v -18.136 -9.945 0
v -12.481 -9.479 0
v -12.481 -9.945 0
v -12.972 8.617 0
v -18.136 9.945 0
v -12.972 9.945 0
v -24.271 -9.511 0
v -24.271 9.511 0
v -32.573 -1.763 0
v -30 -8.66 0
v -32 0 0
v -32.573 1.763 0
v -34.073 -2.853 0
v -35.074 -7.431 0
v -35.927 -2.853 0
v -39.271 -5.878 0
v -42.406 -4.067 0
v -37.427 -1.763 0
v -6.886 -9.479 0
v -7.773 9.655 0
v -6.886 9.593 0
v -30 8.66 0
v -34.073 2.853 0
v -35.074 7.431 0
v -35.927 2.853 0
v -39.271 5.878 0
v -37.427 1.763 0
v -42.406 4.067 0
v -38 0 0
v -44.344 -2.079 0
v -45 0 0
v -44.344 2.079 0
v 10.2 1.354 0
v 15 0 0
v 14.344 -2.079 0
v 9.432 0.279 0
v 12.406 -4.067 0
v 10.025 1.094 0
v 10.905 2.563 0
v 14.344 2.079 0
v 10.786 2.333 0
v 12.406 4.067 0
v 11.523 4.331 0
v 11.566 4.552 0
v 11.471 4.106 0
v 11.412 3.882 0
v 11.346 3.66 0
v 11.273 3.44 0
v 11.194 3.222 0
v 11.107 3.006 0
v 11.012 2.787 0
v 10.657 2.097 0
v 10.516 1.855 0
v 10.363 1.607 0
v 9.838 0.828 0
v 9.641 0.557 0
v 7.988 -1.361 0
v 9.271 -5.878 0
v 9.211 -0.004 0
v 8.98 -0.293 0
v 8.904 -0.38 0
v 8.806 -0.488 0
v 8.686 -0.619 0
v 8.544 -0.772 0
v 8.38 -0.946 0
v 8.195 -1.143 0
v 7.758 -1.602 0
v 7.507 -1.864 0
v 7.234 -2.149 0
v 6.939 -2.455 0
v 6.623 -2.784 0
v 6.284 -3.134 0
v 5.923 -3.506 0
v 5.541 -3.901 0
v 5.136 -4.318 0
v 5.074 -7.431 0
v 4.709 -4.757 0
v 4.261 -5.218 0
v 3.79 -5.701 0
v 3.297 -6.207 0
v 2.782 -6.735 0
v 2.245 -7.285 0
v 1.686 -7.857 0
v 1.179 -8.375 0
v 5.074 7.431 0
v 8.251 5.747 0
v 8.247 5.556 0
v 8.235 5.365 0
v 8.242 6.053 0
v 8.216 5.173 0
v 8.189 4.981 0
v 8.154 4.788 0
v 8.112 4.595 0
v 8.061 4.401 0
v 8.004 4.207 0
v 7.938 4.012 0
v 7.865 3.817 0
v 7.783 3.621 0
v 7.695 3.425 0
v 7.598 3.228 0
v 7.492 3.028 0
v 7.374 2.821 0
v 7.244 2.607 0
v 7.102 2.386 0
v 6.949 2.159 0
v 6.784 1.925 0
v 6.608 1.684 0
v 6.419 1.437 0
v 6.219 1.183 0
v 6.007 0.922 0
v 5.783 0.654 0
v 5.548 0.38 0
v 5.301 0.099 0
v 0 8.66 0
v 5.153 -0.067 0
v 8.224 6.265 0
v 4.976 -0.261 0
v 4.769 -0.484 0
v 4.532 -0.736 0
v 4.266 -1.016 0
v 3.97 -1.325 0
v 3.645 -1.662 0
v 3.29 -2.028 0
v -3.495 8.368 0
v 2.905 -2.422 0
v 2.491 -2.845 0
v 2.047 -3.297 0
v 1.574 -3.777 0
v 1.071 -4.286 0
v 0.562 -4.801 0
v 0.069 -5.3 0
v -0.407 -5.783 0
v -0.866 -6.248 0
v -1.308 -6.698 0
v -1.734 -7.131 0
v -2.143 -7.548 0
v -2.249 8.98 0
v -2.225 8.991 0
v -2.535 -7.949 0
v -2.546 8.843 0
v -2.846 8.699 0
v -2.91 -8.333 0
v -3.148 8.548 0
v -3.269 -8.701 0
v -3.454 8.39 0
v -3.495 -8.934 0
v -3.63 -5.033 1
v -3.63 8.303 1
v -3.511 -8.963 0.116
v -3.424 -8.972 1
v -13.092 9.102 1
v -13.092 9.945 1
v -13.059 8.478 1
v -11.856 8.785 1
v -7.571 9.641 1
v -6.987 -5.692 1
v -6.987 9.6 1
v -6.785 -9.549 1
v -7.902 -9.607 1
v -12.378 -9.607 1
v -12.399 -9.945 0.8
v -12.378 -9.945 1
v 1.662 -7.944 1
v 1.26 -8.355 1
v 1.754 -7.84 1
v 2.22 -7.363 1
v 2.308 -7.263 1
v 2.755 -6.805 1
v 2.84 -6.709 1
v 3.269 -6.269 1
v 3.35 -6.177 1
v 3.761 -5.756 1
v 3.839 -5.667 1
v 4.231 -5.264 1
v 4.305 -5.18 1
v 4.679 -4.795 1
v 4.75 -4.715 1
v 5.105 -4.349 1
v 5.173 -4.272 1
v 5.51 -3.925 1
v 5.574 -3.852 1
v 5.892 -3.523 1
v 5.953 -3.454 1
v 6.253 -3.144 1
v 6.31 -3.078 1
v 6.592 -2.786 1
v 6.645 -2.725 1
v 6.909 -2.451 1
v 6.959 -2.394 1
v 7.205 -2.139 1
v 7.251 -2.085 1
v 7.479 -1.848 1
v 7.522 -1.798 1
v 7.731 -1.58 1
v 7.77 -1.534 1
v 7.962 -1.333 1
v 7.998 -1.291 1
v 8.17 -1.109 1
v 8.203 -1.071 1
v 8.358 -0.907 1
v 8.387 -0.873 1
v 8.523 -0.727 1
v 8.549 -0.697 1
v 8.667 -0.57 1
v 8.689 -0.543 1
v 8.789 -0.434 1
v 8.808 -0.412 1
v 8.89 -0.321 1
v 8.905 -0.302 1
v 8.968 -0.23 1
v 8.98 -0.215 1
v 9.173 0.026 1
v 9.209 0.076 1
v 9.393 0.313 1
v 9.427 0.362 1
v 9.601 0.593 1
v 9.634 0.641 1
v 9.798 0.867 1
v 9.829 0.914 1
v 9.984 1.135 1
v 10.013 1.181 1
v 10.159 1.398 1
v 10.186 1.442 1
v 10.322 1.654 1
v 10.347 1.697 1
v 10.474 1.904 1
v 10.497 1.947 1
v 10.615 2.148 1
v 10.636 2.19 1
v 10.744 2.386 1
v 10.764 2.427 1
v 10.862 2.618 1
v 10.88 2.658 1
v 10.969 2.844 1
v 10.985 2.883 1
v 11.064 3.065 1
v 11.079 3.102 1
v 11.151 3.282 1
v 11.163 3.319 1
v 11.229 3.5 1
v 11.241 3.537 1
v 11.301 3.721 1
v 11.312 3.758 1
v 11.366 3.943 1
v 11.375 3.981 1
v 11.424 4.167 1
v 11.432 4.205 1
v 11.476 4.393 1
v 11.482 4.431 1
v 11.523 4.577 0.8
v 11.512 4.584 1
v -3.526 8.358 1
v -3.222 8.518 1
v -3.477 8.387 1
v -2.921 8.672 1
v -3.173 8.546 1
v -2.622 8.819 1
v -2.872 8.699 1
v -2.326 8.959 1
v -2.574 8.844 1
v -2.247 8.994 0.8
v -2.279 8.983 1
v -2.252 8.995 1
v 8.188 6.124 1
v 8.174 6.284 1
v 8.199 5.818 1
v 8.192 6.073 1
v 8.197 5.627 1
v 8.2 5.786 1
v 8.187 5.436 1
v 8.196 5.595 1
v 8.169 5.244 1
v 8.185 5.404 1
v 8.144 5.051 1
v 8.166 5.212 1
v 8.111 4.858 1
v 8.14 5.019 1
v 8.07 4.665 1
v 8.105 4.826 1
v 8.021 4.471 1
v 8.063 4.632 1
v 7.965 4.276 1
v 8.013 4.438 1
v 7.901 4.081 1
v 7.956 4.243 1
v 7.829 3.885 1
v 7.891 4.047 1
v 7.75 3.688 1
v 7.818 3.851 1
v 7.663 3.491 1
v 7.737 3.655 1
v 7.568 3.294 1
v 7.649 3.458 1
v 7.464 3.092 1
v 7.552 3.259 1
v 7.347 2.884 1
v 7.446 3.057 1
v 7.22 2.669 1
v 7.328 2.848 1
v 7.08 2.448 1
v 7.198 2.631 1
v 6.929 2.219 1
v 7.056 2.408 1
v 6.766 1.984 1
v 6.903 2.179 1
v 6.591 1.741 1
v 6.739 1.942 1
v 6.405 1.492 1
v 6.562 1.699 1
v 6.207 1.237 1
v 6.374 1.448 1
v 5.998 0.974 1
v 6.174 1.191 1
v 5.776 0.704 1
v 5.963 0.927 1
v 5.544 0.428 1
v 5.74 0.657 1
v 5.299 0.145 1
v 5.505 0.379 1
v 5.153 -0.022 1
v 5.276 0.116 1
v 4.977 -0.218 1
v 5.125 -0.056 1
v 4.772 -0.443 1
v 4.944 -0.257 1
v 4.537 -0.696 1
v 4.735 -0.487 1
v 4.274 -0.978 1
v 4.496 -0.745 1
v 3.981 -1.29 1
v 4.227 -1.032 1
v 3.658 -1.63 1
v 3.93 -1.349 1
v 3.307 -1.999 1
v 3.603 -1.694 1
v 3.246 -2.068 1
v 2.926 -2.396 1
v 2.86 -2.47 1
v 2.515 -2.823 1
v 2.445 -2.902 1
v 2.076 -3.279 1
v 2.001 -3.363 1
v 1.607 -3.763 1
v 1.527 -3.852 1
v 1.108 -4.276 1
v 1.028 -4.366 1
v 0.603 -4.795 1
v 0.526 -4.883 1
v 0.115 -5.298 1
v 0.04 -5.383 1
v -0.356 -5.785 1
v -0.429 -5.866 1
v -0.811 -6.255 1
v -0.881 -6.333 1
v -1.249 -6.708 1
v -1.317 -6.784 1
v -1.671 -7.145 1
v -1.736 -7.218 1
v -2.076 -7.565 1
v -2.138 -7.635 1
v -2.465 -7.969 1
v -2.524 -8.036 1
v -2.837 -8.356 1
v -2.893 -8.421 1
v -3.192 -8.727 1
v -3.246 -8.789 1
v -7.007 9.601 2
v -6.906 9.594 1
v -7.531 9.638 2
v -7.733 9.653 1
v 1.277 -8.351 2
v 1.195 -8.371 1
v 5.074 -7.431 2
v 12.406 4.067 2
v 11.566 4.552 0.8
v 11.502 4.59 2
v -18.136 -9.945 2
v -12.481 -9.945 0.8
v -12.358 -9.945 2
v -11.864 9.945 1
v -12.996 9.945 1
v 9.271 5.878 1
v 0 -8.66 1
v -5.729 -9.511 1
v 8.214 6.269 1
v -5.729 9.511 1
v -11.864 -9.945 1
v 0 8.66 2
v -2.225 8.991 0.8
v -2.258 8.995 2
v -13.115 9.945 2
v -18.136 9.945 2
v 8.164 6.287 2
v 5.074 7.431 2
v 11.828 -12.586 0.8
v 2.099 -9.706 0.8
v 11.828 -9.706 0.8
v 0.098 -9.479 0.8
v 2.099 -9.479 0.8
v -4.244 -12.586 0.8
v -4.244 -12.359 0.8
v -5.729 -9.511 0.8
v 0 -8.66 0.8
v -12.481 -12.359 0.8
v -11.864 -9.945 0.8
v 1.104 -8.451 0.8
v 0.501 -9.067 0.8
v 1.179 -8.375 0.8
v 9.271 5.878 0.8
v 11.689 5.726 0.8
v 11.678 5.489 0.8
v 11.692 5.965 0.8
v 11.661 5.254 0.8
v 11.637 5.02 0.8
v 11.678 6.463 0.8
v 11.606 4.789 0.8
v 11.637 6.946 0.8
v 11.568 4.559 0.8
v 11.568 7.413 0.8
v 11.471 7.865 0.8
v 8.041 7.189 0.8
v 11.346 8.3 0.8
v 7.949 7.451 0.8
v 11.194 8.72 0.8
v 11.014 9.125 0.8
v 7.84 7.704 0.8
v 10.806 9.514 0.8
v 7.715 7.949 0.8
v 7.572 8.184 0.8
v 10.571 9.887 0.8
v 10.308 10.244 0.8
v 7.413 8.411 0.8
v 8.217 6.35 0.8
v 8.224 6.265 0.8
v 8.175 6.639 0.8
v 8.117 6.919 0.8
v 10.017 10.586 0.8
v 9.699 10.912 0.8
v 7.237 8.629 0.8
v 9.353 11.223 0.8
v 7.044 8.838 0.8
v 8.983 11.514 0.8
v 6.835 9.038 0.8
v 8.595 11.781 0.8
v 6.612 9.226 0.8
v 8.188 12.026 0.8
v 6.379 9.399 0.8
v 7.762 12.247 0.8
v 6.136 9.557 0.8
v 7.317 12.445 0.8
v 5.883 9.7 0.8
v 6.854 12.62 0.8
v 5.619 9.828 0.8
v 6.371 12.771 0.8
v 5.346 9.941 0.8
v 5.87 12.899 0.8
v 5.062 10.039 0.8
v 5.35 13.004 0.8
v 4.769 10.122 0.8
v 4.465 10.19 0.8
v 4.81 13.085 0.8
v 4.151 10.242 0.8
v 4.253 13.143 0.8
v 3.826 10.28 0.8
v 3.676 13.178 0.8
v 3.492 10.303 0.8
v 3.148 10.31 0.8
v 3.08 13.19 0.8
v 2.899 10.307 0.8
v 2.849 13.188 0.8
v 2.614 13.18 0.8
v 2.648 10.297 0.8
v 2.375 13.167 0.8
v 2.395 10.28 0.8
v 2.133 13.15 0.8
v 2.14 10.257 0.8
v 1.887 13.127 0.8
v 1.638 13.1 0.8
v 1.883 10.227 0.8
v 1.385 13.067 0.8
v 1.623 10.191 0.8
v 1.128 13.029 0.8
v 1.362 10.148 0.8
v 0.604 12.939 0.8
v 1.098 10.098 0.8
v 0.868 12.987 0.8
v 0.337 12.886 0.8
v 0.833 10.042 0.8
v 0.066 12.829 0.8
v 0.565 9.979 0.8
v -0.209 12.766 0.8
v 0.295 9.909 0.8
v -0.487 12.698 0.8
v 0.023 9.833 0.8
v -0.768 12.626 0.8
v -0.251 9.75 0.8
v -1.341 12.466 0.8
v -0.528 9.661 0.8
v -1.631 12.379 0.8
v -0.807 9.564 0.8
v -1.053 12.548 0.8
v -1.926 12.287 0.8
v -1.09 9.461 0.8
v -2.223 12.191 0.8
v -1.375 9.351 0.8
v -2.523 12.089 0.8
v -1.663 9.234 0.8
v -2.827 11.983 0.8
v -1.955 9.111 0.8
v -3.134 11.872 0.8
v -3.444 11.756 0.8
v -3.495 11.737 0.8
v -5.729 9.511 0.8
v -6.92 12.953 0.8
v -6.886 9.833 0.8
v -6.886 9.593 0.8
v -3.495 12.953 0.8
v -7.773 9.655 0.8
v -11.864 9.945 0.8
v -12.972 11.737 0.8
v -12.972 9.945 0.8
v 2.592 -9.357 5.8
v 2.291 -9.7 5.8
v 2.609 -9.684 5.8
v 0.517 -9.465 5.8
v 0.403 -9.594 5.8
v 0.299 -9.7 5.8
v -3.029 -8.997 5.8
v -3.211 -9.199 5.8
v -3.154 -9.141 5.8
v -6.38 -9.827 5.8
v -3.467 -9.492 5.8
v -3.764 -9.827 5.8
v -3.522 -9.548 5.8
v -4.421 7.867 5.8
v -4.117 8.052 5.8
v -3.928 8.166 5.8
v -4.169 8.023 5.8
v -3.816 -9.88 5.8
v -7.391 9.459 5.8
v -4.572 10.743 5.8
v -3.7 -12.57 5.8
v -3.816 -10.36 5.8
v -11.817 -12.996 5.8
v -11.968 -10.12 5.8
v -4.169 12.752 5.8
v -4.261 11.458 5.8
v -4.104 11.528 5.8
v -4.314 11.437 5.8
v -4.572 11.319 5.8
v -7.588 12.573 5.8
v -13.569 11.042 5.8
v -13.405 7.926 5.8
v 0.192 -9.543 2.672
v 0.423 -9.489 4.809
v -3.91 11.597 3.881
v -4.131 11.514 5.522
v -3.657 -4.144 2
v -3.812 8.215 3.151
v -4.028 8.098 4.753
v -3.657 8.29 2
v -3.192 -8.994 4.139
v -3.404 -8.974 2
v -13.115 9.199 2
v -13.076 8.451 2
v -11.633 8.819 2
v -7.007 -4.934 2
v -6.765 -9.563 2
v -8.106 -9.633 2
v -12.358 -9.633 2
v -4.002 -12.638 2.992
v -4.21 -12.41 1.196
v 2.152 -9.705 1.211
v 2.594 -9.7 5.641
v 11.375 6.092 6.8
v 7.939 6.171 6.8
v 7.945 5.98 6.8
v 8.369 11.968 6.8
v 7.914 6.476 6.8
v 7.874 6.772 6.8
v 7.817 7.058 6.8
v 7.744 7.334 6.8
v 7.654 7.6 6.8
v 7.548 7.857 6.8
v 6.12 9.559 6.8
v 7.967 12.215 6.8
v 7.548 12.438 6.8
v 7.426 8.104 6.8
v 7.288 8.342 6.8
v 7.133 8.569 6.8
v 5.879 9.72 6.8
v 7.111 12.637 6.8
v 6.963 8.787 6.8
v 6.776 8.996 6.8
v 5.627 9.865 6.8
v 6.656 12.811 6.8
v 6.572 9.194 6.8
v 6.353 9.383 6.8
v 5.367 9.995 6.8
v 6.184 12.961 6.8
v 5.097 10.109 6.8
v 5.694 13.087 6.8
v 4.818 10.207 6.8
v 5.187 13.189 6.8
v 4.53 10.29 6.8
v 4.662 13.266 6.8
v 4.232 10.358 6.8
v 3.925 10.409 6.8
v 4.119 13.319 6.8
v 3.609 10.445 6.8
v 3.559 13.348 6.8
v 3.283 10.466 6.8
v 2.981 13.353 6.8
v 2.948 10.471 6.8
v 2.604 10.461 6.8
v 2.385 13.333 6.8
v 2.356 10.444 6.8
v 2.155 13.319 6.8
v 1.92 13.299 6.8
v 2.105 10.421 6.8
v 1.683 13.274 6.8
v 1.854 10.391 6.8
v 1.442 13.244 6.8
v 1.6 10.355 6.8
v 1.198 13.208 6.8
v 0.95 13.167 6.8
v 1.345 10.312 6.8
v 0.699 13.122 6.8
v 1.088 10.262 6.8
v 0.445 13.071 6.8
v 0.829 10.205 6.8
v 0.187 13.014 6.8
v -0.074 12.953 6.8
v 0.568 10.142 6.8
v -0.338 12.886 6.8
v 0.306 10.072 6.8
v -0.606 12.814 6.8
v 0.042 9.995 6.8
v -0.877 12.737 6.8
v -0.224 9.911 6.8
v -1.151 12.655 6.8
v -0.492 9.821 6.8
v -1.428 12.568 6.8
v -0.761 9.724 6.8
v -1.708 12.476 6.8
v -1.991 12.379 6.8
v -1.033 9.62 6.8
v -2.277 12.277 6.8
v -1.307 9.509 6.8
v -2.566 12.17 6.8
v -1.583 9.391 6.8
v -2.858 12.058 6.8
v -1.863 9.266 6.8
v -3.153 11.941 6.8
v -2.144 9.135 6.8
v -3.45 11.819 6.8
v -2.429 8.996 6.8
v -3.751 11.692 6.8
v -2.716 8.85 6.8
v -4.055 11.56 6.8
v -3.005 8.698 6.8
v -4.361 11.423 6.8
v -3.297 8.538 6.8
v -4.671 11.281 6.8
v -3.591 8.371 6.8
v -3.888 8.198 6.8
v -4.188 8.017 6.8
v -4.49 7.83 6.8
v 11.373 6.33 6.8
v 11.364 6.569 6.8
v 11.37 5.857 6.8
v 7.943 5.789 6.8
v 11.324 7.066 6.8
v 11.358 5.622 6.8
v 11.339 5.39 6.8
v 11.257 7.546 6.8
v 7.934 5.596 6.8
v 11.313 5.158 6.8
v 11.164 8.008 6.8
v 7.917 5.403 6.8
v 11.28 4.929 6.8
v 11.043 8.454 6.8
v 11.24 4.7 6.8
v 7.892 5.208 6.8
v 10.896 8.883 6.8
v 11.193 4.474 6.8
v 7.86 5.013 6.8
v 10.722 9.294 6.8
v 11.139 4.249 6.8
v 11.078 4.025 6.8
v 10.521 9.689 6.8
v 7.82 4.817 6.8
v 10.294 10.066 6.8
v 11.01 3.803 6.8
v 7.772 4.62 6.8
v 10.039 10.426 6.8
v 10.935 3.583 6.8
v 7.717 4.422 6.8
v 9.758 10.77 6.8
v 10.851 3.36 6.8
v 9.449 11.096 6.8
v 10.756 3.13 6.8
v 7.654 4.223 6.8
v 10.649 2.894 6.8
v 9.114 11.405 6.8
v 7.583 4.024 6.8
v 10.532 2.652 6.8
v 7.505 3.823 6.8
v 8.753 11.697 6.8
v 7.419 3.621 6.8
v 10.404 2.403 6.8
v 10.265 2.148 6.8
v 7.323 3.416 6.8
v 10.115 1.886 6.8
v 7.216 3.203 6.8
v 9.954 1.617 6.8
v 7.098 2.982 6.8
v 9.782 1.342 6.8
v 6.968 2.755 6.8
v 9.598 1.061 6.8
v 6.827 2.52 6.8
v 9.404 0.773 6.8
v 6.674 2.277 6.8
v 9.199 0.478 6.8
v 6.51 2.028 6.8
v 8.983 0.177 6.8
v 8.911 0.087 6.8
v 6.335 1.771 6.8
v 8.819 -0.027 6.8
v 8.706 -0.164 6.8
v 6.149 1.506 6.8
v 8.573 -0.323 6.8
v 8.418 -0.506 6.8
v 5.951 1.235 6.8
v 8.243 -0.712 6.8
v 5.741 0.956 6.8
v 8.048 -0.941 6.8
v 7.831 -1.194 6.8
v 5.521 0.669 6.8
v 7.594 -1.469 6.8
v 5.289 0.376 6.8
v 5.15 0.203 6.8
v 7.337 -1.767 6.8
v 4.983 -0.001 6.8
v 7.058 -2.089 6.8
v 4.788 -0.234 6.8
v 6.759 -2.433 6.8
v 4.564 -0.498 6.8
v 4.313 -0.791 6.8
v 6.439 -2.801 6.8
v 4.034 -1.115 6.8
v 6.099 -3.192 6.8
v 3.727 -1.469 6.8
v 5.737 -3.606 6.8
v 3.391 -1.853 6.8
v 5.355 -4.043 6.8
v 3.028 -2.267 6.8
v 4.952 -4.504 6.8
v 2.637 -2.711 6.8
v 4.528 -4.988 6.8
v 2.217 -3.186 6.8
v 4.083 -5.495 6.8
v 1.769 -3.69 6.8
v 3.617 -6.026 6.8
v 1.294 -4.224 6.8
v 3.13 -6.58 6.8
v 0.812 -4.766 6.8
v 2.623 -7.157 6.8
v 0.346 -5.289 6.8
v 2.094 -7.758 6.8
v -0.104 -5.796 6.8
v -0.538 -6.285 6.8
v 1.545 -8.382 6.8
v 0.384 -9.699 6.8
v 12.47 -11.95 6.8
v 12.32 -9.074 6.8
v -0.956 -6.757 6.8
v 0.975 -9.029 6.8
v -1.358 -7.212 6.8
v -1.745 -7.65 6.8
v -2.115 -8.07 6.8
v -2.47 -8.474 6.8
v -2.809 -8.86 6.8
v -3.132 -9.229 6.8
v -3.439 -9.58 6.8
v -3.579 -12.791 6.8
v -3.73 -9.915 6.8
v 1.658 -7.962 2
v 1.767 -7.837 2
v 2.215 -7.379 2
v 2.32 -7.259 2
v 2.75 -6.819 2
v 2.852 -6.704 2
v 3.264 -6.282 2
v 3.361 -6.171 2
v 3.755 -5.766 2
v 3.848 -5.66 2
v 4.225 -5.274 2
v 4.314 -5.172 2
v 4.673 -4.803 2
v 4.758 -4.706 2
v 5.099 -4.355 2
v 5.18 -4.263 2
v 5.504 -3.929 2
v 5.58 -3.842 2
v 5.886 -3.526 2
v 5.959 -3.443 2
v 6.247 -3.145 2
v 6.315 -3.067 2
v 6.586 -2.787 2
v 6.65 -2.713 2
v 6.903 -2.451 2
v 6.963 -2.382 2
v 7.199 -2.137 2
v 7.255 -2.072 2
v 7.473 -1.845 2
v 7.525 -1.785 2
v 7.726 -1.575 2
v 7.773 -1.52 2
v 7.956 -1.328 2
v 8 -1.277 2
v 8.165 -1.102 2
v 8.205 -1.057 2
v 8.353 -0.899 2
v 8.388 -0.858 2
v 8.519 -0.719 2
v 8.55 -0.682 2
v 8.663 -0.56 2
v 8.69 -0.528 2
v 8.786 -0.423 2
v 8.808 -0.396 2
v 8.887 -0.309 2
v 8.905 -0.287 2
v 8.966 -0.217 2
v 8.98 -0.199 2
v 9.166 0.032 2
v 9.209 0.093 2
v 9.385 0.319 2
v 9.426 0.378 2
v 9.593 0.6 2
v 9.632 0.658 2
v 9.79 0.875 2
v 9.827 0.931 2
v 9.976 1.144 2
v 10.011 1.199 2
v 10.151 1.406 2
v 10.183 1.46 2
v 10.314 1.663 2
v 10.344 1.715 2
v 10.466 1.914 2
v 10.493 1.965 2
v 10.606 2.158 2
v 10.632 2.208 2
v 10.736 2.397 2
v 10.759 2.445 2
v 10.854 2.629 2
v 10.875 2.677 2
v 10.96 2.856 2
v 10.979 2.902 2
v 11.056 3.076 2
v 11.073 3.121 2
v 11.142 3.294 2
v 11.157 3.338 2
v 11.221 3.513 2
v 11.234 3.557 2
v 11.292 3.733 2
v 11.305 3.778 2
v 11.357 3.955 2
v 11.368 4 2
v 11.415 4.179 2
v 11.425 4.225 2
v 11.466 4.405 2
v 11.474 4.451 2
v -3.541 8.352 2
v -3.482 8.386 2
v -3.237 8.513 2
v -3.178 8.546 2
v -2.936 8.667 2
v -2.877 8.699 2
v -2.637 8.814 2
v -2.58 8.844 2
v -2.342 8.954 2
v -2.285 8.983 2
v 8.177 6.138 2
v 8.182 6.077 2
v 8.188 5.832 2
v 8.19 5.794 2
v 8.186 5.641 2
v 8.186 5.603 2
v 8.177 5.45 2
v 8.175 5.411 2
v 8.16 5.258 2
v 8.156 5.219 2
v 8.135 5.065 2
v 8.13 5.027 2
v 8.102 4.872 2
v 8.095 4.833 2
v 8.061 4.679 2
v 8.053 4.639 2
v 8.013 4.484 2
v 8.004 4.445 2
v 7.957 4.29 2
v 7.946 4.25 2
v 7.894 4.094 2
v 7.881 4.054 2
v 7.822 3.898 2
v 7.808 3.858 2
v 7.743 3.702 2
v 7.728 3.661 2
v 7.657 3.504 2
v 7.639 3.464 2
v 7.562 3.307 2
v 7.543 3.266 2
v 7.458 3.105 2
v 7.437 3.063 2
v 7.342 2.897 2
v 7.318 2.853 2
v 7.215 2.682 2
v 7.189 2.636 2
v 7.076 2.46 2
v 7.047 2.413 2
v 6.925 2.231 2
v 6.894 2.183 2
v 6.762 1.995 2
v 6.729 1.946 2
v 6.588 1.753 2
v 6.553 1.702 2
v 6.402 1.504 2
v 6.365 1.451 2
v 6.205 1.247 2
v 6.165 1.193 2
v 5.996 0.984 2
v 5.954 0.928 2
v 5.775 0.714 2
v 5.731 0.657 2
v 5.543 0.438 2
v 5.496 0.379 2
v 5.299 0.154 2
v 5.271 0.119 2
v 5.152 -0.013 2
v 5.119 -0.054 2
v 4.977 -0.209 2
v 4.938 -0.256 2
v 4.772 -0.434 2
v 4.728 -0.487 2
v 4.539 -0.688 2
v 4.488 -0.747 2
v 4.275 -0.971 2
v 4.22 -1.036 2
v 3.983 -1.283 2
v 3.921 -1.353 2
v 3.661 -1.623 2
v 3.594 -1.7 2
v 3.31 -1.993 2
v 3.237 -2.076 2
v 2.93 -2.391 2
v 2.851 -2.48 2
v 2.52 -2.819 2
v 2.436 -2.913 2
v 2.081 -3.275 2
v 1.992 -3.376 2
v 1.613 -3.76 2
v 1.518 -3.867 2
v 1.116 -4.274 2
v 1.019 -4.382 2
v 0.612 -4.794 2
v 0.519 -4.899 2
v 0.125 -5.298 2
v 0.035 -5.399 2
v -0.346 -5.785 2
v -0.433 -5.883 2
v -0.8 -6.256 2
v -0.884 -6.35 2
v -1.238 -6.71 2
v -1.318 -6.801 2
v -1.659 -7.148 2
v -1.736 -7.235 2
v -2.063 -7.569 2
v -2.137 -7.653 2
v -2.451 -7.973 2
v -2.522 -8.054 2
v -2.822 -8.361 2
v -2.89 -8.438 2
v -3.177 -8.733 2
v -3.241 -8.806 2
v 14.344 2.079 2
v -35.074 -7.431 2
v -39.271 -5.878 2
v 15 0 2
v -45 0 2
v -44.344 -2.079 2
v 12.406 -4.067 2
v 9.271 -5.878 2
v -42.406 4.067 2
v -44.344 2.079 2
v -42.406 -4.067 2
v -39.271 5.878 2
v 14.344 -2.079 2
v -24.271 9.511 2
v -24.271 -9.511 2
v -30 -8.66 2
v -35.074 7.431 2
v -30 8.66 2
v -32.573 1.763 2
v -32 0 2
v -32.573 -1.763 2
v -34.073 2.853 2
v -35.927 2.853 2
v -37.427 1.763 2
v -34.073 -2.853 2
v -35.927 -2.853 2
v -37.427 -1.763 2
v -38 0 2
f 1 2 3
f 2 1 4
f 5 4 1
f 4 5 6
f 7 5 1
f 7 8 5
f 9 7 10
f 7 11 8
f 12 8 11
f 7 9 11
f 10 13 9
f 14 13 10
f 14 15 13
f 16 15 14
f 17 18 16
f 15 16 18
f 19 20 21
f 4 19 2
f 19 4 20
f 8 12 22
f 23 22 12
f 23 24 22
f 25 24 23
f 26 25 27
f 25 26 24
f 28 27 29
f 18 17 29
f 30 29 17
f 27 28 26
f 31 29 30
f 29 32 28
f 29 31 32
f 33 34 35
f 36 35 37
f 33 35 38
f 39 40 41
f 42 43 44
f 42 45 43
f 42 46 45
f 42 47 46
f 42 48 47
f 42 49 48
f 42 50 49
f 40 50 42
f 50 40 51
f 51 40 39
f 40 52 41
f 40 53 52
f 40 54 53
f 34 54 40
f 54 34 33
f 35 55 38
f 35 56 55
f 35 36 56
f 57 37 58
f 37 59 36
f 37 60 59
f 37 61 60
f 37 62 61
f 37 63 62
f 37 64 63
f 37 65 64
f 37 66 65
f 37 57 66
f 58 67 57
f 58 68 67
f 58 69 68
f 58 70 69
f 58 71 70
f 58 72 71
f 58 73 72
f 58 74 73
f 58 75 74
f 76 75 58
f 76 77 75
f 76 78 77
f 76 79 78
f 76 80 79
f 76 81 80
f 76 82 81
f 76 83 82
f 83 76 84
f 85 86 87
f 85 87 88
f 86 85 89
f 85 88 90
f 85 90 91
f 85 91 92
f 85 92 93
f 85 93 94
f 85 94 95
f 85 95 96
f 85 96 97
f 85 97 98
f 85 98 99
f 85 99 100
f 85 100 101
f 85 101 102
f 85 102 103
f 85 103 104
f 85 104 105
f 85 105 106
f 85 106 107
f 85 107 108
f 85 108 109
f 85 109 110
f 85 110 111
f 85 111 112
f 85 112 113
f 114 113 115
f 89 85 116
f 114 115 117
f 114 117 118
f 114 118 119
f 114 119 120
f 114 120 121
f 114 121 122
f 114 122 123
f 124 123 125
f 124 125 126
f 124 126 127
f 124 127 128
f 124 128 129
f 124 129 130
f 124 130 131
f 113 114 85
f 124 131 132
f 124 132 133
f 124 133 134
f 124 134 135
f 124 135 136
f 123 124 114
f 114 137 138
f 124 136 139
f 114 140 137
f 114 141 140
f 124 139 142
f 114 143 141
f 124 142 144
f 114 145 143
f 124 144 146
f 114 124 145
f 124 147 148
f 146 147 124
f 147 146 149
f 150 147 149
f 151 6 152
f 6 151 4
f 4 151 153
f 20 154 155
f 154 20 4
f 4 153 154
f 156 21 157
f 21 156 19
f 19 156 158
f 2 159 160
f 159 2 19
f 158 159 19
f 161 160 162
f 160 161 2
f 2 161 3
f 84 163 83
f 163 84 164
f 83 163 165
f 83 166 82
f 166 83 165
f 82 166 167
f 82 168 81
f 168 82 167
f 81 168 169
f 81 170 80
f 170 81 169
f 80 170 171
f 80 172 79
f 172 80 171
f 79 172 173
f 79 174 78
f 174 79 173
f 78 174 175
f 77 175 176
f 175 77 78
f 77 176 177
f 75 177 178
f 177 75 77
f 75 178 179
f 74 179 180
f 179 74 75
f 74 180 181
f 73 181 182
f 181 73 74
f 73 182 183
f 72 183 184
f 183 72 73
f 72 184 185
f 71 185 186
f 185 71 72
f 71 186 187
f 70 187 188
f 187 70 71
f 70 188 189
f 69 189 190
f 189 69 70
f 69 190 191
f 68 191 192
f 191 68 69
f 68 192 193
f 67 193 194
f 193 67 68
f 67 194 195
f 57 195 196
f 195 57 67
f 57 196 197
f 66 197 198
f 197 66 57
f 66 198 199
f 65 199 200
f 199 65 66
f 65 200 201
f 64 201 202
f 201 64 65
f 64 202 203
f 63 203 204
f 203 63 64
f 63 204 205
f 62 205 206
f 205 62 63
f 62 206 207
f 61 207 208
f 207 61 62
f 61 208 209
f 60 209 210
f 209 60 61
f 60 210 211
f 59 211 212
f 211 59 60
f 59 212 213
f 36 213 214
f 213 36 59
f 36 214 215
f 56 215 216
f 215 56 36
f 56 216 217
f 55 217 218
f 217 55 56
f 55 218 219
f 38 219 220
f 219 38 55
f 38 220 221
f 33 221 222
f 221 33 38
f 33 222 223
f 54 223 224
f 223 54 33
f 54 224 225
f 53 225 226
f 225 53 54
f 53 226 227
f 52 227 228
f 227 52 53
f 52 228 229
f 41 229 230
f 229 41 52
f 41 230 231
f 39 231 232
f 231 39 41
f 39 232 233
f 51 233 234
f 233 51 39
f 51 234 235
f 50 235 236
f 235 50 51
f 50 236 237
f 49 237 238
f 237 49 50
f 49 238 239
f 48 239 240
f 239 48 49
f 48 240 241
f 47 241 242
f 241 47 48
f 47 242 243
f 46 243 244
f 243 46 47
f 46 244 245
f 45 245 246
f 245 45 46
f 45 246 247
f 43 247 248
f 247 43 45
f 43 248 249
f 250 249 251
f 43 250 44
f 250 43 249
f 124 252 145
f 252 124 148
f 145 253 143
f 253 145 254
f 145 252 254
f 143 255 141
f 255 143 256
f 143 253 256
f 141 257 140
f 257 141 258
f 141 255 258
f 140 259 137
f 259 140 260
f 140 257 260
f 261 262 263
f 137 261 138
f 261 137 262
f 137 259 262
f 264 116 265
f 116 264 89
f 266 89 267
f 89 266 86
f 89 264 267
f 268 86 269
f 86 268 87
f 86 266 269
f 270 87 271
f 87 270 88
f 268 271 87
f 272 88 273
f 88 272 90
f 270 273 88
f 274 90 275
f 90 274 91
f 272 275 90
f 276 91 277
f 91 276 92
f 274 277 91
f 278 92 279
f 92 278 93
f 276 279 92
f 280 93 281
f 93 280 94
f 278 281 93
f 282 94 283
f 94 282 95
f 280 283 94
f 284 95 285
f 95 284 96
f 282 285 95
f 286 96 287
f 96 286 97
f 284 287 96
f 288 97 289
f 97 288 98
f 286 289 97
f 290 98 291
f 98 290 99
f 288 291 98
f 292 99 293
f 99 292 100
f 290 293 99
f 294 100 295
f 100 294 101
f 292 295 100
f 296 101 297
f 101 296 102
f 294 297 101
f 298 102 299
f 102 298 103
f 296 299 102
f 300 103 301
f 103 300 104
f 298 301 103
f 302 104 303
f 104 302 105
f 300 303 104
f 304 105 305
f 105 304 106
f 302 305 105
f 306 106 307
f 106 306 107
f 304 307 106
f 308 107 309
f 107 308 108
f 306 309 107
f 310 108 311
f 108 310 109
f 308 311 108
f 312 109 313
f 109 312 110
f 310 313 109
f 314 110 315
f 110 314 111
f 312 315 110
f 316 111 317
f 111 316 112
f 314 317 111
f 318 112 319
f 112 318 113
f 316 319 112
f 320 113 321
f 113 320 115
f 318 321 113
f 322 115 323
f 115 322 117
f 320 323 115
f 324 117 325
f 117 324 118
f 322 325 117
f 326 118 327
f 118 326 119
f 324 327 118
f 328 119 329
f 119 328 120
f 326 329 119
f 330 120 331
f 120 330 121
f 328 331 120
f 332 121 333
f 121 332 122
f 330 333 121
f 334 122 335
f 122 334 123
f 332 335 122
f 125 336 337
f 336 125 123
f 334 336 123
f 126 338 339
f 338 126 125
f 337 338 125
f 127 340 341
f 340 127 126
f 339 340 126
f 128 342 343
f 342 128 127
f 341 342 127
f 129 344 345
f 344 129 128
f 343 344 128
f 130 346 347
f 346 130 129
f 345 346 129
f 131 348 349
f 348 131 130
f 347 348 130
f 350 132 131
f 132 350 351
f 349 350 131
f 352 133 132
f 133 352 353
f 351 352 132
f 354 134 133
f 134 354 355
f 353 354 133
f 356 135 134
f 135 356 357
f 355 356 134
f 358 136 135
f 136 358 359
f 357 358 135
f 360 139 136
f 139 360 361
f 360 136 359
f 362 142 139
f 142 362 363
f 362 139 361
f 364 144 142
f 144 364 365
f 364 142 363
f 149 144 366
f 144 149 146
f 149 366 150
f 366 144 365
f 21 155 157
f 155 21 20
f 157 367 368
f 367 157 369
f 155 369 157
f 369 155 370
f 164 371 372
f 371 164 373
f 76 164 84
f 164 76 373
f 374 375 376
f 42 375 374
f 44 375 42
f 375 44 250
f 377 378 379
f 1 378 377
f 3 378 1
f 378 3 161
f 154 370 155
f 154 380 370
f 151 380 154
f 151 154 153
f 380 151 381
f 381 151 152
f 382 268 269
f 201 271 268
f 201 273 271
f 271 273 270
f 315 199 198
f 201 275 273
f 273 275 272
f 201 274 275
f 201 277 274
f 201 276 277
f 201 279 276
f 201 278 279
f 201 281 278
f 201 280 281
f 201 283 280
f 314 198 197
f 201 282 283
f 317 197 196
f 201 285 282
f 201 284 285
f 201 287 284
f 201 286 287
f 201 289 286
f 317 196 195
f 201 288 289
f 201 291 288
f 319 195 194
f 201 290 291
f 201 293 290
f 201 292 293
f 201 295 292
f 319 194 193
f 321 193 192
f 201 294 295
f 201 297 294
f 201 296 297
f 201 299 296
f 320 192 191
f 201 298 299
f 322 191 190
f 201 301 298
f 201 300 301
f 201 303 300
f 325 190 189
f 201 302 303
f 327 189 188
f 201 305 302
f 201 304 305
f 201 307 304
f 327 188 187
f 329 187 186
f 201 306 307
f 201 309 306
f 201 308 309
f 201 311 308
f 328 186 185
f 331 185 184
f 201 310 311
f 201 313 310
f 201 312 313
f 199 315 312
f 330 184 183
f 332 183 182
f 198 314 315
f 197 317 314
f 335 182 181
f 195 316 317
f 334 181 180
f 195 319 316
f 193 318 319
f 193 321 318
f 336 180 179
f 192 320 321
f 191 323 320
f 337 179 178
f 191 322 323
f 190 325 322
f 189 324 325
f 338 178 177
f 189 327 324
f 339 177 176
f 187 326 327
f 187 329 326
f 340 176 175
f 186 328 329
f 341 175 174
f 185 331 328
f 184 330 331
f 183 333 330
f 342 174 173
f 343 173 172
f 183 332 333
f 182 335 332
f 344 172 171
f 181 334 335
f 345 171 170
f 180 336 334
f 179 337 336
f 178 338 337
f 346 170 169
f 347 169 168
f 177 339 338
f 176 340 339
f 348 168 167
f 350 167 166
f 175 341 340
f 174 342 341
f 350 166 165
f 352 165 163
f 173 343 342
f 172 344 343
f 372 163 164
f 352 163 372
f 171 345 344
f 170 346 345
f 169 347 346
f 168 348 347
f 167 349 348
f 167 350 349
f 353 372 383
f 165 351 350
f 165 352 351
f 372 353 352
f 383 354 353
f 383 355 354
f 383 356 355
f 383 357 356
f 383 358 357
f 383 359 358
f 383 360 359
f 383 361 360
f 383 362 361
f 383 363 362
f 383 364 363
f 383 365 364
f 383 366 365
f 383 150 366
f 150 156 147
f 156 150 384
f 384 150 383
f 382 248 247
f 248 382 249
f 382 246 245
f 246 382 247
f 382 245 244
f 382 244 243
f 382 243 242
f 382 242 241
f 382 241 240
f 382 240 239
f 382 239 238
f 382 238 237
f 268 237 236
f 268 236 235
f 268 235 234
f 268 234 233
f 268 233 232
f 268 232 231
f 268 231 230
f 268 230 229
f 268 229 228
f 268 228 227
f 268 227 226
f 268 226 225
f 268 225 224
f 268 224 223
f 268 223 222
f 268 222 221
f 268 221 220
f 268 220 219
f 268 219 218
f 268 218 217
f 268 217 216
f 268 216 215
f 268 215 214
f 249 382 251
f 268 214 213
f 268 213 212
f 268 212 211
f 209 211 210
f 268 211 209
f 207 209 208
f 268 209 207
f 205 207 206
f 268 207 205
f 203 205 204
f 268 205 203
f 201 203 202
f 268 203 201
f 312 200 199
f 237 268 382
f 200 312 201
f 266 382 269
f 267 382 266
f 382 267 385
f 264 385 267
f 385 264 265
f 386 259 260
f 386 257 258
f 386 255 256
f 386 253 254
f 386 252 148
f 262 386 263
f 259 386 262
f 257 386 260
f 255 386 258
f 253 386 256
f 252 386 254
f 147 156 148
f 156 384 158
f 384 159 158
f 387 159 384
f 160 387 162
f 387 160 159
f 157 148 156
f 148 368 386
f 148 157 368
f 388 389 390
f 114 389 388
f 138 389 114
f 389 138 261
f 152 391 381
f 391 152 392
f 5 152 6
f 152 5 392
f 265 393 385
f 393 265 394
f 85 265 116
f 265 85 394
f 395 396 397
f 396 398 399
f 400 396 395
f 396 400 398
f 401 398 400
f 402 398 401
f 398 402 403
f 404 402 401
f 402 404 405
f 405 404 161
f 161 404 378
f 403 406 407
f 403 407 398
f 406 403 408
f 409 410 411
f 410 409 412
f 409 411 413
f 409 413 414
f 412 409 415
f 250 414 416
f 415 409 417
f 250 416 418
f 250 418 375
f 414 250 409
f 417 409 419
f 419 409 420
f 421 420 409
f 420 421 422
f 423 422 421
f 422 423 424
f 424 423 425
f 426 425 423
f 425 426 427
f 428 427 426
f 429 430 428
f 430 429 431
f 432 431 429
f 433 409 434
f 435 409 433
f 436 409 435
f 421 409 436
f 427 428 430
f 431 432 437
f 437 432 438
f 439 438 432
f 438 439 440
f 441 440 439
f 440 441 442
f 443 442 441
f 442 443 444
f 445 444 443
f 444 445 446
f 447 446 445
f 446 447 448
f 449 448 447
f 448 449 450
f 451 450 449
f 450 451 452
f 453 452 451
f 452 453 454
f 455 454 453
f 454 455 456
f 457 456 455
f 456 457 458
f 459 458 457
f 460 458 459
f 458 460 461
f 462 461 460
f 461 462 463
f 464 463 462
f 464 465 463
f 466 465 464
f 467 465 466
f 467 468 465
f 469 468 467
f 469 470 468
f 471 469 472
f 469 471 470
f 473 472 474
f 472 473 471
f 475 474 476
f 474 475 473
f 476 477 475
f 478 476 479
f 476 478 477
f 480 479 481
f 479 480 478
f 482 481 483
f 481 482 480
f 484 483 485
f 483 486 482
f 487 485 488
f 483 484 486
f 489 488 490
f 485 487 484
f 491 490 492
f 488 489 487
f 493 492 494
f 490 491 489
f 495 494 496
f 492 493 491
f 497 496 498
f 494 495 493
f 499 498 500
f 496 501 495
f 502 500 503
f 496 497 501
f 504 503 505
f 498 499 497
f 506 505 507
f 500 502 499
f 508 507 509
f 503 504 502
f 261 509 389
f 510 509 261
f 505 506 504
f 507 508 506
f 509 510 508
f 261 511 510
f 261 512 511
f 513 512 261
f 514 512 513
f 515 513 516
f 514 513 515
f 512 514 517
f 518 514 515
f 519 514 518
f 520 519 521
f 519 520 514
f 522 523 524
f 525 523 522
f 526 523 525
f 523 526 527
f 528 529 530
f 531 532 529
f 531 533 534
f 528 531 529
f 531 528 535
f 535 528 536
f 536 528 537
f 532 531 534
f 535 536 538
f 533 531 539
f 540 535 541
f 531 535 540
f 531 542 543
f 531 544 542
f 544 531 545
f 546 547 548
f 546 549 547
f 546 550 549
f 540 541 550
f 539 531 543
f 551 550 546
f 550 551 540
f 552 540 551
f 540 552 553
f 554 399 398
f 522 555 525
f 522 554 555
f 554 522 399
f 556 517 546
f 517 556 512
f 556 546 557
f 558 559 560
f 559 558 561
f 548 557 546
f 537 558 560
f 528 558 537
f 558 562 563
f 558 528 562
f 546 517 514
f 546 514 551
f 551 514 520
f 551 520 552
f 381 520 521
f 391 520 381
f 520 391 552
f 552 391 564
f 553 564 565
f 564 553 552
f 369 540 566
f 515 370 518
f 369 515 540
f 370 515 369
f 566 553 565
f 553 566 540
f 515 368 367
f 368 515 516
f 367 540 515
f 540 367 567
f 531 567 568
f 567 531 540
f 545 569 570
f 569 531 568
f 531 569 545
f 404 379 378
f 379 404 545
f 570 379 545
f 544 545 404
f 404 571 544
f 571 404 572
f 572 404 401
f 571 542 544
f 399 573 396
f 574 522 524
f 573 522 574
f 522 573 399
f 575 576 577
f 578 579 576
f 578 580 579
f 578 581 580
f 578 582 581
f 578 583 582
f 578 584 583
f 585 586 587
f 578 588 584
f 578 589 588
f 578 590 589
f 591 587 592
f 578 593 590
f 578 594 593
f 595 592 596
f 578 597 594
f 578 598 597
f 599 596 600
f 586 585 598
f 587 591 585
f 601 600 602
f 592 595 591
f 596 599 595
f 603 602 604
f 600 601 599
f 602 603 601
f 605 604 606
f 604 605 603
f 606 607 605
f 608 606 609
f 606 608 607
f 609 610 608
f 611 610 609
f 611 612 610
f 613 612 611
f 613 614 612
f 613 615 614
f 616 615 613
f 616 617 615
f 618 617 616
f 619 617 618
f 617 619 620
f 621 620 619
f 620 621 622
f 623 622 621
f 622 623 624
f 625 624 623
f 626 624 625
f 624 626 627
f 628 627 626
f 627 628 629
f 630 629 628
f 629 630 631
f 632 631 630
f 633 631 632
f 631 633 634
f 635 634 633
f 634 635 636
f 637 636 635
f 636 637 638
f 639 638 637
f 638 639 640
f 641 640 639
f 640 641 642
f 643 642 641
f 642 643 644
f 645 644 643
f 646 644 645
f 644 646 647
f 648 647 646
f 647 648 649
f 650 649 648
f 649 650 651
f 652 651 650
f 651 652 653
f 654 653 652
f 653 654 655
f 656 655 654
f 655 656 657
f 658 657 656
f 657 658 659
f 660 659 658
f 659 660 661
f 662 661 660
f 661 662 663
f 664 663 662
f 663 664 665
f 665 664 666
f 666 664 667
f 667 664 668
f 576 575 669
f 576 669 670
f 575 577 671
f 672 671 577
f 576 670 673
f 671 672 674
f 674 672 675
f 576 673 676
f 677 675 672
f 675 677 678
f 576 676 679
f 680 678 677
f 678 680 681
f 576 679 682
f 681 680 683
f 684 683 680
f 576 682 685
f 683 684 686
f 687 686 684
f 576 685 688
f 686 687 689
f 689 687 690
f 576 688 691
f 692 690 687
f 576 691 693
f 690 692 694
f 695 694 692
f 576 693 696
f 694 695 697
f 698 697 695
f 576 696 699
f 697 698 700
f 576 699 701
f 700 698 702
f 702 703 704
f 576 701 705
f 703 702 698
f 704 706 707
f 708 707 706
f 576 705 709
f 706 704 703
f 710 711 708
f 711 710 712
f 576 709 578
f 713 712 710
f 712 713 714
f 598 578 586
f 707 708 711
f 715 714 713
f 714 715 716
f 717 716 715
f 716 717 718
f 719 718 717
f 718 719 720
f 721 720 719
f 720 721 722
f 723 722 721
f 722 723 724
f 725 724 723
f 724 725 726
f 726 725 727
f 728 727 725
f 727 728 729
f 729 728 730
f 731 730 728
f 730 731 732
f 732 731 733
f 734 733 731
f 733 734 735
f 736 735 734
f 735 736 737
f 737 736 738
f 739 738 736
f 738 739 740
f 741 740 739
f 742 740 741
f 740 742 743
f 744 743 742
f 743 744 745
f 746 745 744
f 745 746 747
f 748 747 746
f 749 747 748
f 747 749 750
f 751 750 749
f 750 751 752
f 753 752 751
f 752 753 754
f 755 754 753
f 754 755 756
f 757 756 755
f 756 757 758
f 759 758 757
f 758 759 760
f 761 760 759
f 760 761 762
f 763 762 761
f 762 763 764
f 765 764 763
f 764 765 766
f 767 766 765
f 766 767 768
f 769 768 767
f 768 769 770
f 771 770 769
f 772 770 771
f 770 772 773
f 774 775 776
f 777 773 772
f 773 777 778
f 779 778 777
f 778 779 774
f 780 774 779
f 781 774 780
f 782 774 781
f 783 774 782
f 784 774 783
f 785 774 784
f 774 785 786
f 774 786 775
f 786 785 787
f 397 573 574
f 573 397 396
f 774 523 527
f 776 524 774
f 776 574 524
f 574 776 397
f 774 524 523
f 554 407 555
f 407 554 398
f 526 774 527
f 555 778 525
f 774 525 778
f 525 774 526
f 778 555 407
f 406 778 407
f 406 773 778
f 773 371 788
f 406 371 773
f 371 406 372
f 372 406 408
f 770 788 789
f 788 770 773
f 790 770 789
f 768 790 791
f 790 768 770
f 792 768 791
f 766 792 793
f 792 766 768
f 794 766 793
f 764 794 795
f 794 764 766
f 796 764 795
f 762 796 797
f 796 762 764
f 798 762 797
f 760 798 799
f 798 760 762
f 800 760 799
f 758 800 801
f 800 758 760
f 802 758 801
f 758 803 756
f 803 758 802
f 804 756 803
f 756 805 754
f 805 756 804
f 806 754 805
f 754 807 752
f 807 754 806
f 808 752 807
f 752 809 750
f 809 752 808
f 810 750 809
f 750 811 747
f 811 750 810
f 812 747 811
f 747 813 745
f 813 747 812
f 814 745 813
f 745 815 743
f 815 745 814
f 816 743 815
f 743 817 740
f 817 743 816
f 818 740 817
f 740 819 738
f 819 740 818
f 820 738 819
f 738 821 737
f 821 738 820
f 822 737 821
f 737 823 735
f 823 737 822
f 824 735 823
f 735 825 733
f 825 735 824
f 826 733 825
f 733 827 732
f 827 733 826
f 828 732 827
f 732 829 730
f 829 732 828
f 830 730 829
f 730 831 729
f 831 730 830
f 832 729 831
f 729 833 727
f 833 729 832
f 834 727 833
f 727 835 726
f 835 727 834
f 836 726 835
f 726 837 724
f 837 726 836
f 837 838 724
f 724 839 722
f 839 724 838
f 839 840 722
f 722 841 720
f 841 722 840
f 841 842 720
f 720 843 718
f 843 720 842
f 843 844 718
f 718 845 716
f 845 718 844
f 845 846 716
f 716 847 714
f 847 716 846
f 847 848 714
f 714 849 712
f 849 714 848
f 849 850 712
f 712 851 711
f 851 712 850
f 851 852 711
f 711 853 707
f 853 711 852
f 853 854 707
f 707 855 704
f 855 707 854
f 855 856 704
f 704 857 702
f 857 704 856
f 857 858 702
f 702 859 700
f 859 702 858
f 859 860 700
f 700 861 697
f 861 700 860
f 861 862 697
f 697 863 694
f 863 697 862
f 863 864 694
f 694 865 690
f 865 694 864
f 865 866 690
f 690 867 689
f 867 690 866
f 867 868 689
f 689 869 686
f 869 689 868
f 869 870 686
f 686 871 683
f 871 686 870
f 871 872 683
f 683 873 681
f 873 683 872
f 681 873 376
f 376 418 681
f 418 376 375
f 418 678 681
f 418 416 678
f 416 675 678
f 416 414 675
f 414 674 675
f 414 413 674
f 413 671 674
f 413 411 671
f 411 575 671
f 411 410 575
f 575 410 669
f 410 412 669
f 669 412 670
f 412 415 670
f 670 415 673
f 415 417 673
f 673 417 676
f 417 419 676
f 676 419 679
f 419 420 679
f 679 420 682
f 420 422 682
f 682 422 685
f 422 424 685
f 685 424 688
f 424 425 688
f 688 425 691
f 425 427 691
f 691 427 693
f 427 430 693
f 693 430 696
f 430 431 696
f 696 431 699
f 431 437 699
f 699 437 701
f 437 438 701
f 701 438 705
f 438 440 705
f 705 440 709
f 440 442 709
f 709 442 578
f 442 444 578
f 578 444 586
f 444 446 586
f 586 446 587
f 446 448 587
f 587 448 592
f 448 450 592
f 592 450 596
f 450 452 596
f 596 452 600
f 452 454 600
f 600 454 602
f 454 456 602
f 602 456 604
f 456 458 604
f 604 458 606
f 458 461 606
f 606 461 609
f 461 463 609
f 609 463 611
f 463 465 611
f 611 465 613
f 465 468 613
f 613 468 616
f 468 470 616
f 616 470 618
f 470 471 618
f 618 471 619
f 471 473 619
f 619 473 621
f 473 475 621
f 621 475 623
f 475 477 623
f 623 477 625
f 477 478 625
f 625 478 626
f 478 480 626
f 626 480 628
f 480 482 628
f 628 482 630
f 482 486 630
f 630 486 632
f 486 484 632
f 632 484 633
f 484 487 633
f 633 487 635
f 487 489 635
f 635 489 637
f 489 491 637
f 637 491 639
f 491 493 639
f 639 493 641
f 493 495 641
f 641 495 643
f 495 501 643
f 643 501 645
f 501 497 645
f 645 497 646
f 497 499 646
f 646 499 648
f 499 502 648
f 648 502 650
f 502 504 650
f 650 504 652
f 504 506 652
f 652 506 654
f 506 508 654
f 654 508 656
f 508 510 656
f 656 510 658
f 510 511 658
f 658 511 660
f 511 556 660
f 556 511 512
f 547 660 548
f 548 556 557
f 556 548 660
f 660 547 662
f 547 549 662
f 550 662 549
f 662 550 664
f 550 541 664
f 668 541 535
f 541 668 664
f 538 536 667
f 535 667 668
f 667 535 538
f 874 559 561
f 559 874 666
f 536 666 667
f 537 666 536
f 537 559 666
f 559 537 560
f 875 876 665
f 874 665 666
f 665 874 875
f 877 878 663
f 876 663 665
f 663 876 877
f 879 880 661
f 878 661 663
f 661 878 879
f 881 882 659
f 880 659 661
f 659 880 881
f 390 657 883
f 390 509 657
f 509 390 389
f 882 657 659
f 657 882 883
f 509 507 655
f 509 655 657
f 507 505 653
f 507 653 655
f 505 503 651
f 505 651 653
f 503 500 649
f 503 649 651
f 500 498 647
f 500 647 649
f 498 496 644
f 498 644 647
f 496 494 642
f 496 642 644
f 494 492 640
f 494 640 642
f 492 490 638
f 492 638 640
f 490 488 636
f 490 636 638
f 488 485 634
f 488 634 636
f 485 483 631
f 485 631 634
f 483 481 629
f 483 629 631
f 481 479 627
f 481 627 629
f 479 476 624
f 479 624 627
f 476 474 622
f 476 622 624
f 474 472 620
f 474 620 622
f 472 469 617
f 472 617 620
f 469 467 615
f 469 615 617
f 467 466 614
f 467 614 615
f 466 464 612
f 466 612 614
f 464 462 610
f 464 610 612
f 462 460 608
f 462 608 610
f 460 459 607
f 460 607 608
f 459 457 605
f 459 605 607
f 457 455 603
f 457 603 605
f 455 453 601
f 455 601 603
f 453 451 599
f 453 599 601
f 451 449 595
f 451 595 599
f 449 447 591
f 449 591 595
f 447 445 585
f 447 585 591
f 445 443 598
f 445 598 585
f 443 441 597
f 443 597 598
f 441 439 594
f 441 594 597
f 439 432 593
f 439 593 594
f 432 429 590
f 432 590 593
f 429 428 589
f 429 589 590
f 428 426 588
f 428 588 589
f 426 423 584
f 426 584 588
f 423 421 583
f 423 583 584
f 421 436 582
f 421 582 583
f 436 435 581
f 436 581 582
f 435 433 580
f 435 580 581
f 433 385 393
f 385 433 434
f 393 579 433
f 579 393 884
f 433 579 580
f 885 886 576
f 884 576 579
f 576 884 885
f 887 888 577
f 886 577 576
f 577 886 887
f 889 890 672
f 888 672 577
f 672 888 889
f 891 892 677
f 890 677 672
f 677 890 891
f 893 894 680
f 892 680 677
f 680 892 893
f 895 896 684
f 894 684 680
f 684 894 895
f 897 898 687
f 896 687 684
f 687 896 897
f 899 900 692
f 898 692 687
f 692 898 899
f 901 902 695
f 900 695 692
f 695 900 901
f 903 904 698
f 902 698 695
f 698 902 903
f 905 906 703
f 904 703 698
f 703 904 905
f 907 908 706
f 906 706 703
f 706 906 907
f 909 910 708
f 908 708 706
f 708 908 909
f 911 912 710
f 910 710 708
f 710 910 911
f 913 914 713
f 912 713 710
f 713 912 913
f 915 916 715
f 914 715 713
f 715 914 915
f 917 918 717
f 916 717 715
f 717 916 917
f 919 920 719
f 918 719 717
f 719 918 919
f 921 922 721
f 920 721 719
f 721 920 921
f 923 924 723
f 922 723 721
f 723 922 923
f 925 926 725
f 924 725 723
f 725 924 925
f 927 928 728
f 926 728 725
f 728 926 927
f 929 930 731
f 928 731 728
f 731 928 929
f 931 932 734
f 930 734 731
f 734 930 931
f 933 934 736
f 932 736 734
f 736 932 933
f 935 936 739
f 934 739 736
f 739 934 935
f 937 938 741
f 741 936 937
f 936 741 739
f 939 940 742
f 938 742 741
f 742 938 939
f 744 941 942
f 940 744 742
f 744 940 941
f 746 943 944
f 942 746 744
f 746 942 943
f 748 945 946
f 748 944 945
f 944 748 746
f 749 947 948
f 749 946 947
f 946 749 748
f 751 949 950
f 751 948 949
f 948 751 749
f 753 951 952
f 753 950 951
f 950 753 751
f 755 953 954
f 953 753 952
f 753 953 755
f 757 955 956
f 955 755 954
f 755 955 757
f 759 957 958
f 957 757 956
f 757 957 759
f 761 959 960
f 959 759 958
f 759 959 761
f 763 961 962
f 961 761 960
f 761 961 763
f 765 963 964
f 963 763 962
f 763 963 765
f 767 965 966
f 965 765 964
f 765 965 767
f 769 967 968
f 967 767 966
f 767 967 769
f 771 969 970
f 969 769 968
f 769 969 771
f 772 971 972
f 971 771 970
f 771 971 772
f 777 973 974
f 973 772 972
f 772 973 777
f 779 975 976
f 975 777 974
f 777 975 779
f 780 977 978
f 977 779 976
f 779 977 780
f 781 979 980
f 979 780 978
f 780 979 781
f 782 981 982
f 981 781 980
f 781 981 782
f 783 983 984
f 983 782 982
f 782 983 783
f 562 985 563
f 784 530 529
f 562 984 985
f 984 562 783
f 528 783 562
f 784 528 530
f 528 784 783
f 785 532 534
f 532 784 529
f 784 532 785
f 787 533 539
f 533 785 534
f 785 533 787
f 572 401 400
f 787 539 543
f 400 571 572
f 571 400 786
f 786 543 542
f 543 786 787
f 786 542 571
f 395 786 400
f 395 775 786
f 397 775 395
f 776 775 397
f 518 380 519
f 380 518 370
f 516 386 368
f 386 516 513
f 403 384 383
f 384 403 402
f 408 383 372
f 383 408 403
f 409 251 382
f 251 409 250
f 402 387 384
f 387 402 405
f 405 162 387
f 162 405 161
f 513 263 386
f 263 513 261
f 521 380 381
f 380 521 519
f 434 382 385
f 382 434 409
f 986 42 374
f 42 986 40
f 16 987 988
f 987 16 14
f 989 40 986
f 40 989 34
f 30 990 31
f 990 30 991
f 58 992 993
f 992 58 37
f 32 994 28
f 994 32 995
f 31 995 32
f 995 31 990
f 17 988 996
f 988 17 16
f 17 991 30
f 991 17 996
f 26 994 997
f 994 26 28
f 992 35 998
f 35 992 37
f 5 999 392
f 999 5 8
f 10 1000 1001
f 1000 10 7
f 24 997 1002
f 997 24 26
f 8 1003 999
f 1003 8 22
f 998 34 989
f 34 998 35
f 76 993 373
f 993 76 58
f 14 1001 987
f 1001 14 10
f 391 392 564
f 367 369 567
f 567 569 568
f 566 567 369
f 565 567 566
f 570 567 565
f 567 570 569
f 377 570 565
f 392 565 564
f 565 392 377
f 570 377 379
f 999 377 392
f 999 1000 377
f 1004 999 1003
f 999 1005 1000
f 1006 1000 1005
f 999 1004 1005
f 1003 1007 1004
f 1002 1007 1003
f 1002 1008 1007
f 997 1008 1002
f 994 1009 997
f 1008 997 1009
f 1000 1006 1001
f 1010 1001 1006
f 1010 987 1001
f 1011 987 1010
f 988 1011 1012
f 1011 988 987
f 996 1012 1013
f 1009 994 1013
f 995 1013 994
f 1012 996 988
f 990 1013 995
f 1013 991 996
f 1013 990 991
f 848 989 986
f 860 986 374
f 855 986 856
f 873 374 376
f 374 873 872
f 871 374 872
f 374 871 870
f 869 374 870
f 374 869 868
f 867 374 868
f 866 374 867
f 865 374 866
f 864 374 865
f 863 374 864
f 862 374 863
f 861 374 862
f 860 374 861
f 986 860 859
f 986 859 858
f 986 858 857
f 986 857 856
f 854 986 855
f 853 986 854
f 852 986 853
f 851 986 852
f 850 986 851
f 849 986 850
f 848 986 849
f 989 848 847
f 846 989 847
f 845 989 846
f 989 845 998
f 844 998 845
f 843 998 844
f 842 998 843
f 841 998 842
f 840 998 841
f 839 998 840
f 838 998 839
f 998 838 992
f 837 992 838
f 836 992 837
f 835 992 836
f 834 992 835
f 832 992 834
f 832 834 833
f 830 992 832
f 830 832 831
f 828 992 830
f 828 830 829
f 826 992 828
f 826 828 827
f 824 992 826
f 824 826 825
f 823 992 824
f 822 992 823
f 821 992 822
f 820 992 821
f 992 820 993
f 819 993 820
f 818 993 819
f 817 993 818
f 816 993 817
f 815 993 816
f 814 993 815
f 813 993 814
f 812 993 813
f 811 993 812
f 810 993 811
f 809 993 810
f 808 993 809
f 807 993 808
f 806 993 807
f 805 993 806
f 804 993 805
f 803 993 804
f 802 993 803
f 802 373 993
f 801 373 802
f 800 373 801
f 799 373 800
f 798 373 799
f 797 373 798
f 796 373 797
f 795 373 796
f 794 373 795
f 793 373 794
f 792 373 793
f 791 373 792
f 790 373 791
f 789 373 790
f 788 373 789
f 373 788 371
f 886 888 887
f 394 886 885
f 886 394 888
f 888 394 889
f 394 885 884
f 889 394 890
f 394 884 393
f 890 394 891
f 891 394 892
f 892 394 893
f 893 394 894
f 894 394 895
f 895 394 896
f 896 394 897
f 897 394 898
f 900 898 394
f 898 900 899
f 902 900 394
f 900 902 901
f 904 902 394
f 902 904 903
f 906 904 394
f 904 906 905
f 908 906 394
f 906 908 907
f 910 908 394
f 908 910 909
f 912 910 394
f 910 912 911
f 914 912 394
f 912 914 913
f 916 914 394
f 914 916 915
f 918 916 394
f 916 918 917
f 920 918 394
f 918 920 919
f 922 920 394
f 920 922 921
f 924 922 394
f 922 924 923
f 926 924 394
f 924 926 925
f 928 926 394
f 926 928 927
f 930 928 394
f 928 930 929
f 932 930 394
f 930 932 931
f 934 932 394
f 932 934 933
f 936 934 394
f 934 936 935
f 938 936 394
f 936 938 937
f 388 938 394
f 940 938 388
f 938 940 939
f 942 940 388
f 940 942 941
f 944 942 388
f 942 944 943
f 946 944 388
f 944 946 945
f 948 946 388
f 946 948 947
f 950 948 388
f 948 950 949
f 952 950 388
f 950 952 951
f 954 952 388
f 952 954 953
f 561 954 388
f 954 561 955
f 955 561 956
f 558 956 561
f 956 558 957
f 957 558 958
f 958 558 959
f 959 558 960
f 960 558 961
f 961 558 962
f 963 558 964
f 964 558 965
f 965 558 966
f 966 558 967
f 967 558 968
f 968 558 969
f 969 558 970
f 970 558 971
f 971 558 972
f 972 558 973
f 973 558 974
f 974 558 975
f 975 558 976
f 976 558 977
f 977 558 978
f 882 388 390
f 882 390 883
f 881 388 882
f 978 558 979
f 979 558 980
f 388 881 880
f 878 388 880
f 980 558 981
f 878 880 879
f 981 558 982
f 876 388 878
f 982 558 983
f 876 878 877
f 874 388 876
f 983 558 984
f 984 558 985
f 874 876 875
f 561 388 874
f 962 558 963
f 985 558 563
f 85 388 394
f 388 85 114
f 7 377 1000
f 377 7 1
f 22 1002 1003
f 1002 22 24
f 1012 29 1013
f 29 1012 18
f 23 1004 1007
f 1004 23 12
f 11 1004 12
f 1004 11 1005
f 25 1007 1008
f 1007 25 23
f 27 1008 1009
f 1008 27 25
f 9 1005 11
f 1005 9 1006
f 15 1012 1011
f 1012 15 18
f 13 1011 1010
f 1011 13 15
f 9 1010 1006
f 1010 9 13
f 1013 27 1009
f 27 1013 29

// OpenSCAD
Font_name = "Chewy"; // Font utilizzato

number = "12"; // numero da stampare
height = [5,6,4,5,4,3,5,4,6,4,3,5,4,6]; // varia l'altezza di ogni numero della scritta
spacing = [10,10,10,10,10,10,10,10]; // spazio tra i numeri

twist = -3; // [-10:0.5:10] effetto tridimensionale del singolo numero da stampare
center = 6; // [0:1:70] twist rotation

module targhetta(Text) {

    for (i = [0 : len(Text) -1]) {
       linear_extrude(height = height[i], twist = twist, $fn = 100) {
            translate ([(spacing[i]*i)-center,0,0])
            text(size = 25, text = Text[i], font = Font_name, halign = "center", valign= "center", $fn = 100);
        }
    }
}

translate([0,0,0])
difference(){
translate([0,0,0.8]) targhetta(number);

intersection(){
scale([1.5,0.5,1])translate([-10,0,0])linear_extrude(1) circle(20);
targhetta(number);
}
}

difference(){
scale([1.5,0.5,1])translate([-10,0,0])linear_extrude(2) circle(20);
intersection(){
scale([1.5,0.5,1])translate([-10,0,0])linear_extrude(1) circle(20);
targhetta(number);
}
translate([-35,0,0])cylinder(5,3,3);
}
